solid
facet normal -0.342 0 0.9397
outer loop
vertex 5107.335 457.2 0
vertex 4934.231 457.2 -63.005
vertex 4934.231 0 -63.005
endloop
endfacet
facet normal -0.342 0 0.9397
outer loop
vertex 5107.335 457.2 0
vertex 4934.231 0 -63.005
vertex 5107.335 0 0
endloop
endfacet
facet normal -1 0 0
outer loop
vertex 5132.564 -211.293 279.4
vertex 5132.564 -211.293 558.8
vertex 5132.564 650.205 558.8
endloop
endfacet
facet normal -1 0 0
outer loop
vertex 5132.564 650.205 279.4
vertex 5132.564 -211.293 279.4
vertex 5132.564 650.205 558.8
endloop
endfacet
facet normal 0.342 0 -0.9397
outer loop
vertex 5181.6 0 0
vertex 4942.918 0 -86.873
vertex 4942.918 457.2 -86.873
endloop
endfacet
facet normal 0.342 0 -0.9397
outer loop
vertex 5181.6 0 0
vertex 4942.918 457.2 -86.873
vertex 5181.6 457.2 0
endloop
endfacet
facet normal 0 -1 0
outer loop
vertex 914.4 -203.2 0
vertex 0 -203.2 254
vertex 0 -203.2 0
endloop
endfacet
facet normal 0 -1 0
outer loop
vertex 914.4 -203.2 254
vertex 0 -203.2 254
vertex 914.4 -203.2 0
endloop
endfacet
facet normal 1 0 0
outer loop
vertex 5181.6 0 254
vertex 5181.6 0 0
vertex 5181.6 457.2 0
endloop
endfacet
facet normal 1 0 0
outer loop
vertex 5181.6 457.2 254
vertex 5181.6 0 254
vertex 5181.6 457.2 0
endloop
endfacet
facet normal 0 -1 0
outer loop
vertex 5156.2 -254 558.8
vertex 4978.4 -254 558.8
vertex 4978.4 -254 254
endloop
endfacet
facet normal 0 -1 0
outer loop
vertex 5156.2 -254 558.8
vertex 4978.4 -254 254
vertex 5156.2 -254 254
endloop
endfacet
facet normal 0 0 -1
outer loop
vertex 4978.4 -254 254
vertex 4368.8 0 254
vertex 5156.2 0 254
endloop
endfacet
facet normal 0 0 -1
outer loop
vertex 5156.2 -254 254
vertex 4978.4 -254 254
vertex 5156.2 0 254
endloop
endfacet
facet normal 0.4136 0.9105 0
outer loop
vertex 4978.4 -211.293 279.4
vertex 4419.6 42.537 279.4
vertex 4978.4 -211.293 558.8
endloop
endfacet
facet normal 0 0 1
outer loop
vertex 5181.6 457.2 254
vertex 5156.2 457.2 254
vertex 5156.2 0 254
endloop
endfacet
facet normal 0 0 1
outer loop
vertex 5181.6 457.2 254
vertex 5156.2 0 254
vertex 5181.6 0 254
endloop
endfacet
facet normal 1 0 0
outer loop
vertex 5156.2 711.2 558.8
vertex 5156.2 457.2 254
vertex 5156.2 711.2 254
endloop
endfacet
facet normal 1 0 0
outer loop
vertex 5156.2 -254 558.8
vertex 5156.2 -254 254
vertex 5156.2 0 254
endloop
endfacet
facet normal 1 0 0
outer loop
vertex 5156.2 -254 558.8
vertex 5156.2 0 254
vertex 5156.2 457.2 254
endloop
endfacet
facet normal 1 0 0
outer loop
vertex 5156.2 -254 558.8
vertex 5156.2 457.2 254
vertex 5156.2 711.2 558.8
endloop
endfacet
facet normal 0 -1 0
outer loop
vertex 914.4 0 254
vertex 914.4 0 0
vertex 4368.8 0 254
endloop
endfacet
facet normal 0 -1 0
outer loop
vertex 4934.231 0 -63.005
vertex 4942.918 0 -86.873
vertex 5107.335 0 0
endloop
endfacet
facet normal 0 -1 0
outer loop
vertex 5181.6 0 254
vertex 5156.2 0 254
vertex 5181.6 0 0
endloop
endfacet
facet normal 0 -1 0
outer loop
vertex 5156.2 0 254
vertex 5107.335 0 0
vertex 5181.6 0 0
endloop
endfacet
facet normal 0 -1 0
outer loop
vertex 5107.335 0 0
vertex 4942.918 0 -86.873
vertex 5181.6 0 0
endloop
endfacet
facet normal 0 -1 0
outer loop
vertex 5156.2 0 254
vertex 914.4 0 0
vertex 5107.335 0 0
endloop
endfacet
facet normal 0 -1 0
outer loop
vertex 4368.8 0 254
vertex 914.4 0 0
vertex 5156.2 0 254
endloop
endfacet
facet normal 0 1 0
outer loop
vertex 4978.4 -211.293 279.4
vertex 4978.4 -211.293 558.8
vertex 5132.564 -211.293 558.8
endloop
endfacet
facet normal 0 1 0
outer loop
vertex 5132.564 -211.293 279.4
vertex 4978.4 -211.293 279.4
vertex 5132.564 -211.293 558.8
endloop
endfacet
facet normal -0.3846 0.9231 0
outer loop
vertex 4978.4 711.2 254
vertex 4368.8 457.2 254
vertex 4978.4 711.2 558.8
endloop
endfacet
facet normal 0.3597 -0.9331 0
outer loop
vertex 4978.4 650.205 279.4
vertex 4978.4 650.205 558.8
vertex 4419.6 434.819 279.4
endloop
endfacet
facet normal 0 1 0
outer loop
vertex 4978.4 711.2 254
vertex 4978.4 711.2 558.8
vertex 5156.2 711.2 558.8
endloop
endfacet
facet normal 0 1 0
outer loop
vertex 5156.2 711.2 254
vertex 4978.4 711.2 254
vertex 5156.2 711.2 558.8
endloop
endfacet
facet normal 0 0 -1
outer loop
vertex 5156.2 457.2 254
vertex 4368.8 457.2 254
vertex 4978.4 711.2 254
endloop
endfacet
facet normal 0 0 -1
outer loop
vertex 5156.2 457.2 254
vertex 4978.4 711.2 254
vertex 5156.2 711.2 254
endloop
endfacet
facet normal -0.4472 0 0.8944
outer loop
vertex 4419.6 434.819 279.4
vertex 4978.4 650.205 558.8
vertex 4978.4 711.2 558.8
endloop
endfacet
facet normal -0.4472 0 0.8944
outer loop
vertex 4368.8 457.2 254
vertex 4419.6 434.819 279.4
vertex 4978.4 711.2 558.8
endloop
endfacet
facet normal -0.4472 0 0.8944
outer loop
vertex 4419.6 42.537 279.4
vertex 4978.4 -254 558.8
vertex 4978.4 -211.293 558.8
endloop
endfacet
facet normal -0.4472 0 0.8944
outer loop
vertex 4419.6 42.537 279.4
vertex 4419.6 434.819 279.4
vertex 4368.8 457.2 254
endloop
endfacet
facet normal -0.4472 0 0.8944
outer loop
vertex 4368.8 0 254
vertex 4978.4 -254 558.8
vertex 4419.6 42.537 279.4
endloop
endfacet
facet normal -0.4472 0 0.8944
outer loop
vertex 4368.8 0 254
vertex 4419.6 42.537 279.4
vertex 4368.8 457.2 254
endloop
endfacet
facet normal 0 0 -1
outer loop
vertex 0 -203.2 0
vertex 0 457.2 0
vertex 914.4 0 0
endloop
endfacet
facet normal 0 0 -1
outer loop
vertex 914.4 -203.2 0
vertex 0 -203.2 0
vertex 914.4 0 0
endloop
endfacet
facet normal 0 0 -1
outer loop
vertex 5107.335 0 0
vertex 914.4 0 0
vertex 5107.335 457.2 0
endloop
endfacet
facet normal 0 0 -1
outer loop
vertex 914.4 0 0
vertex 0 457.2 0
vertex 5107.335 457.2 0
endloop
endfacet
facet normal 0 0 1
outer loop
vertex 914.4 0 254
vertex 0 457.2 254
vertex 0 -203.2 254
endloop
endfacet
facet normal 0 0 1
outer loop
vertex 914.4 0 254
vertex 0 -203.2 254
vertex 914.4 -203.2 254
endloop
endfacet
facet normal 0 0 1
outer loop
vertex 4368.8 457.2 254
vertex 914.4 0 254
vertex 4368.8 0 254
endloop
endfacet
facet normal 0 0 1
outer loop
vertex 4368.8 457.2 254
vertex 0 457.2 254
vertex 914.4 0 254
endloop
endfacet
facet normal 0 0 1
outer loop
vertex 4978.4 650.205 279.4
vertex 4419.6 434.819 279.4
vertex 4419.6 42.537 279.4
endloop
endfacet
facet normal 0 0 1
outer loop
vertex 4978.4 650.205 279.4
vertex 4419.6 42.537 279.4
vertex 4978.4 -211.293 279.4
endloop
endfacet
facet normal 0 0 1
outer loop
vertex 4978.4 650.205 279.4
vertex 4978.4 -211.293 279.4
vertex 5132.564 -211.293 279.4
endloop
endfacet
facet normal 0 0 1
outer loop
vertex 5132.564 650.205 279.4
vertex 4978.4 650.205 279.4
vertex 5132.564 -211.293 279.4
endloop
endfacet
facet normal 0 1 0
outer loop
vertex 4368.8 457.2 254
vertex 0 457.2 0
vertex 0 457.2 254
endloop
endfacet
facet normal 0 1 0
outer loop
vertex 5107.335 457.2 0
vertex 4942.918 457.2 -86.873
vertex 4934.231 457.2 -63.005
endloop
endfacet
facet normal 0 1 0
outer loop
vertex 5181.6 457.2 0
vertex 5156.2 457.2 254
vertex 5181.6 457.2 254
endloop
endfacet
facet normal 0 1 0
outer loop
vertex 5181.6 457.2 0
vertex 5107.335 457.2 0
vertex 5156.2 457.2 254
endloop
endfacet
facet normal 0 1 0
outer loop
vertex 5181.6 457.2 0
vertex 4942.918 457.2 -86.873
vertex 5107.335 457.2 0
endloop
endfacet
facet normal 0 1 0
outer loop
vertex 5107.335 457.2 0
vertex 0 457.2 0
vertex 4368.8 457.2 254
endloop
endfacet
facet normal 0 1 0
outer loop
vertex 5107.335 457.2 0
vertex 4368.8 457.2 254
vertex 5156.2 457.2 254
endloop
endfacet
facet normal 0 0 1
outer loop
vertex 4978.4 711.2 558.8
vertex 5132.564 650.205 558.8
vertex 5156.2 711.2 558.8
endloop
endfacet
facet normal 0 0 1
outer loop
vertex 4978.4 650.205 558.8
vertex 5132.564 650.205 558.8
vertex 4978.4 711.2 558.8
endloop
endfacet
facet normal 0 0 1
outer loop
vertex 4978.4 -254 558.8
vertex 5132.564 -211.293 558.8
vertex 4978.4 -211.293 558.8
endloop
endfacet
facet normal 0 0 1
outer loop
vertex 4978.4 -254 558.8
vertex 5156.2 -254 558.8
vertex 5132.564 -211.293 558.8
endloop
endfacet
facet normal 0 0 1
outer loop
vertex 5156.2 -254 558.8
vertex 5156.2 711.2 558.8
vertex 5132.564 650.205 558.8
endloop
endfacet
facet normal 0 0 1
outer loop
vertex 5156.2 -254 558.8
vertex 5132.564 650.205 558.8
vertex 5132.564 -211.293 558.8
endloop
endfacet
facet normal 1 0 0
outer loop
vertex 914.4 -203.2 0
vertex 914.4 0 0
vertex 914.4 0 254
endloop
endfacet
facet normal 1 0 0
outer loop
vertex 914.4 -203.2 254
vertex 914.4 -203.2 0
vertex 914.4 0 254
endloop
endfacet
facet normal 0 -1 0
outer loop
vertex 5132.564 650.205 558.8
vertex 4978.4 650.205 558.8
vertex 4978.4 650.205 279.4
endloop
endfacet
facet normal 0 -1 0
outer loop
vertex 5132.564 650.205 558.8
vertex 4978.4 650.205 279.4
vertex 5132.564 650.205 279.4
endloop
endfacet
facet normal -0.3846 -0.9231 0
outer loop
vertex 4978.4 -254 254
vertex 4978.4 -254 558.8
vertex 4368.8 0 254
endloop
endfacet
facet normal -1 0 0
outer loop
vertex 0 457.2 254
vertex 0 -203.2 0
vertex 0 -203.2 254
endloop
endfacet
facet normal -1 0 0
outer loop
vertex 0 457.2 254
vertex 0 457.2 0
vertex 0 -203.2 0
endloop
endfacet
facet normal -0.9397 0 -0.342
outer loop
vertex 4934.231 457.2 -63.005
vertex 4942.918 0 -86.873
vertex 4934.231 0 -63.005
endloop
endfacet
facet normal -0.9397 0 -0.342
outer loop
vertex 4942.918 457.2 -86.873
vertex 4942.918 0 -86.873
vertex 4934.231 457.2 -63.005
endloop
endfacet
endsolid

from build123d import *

# Parameters (mm, degrees)
F0_W      = 5181.6
F0_H      = 457.2
F1_DEPTH  = 254
F2_W      = 914.4
F2_H      = 254
F3_DEPTH  = 203.2
F6_DEPTH  = 965.2
F8_DEPTH  = 558.801
F9_W      = 154.1635910034
F9_H      = 861.4985744241
F10_DEPTH = 279.4
F12_W     = 254
F12_H     = 457.2
F13_DEPTH = 25.4


with BuildPart() as f1:
    # F0 (on Top) → F1 (new body)
    with BuildSketch(Plane.XY):
        with Locations((2590.8, 228.6)):
            Rectangle(F0_W, F0_H)
    extrude(amount=F1_DEPTH)

    # F2 (on face) → F3 (join)
    with BuildSketch(Plane.XZ):
        with Locations((457.2, 127)):
            Rectangle(F2_W, F2_H)
    extrude(amount=F3_DEPTH)

    # F5 (on offset) → F6 (join)
    with BuildSketch(Plane.XZ.offset(254)):
        Polygon((4368.8, 254), (5156.2, 254), (5156.2, 558.8), (4978.4, 558.8), align=None)
    extrude(amount=-F6_DEPTH)

    # F7 (on face) → F8 (cut, through all)
    with BuildSketch(Plane.XY.offset(558.8)):
        Polygon((4978.4, 711.2), (4368.8, 711.2), (4368.8, 457.2), align=None)
        Polygon((4368.8, -254), (4978.4, -254), (4368.8, 0), align=None)
    extrude(amount=-F8_DEPTH, mode=Mode.SUBTRACT)

    # F9 (on face) → F10 (cut, through all)
    with BuildSketch(Plane.XY.offset(558.8)):
        Polygon((4978.4, -211.2931162119), (4978.4, 650.2054582122), (4409.4405174255, 430.9031367302), (4409.4405174255, 47.1517108381), align=None)
        with Locations((5055.4817955017, 219.4561710002)):
            Rectangle(F9_W, F9_H)
    extrude(amount=-F10_DEPTH, mode=Mode.SUBTRACT)

    # F12 (on face) → F13 (join)
    with BuildSketch(Plane(origin=(606.1320567674, 0, -1665.3341391759), x_dir=(0.9396926208, 0, 0.3420201433), z_dir=(-0.3420201433, 0, 0.9396926208))):
        with Locations((4742.1112838643, 228.6)):
            Rectangle(F12_W, F12_H)
    extrude(amount=F13_DEPTH)


solid = f1.part
